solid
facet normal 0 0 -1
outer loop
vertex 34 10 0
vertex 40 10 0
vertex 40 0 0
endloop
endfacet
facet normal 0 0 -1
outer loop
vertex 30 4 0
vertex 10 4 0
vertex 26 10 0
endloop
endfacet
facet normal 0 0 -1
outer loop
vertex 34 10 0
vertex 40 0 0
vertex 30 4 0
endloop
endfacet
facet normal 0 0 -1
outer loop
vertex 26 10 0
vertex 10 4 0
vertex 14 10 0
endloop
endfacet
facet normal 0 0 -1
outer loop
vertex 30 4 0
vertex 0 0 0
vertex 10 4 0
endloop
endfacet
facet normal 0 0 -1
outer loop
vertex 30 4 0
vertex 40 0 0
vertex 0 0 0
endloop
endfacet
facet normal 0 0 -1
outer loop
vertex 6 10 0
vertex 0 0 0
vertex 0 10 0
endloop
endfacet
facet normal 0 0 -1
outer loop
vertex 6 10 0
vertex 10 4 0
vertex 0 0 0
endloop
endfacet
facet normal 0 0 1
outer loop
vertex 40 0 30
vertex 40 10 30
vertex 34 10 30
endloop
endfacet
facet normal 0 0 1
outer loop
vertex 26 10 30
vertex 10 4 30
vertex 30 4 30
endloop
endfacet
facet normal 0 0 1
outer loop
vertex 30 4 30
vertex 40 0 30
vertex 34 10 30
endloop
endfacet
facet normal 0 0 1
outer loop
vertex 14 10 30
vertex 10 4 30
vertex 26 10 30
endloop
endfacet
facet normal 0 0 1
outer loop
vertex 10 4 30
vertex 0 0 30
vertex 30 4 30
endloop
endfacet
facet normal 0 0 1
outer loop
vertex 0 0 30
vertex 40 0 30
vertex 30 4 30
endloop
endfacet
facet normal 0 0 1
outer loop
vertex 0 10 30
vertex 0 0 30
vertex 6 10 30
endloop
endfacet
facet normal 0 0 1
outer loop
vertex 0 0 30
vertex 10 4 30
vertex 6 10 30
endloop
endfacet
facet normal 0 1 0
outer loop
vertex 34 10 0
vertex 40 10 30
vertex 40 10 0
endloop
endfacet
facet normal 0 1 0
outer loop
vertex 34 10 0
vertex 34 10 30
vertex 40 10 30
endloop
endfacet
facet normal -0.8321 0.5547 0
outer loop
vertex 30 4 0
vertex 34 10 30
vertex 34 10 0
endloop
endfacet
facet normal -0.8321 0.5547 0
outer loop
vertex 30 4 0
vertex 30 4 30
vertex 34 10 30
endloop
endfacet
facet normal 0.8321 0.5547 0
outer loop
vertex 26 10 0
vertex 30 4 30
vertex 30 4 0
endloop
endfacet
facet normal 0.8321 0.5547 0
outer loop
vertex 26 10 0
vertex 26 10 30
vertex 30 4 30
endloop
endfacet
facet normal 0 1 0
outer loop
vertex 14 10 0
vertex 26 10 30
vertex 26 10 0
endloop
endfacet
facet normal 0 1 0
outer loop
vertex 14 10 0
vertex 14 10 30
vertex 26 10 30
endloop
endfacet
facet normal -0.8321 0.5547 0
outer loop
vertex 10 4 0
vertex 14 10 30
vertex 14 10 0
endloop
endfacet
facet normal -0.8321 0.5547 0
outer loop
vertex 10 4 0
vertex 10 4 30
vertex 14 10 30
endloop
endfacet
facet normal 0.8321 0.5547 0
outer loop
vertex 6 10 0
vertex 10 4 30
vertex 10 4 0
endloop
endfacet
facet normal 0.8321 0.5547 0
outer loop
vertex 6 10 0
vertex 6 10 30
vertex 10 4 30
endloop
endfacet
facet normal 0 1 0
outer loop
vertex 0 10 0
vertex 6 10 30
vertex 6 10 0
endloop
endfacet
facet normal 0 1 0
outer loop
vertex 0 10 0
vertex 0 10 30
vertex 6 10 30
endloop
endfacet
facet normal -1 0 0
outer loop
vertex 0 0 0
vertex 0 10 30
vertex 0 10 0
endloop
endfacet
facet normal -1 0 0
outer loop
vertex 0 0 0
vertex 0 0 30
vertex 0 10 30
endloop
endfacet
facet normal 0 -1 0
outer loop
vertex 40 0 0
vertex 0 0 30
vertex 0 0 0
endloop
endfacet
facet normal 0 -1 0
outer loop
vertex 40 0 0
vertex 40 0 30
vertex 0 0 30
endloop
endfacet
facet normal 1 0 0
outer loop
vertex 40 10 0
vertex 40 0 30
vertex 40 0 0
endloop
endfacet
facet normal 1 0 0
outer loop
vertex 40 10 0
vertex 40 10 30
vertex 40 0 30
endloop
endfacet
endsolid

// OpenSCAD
$fn = 32;

// ----------------------------------------------------------------------
// V guide rail: doublev, 40 mm wide
// ----------------------------------------------------------------------

// --- parameters (mm) ---
rail_w = 40;              // rail width, X
base_t = 10;              // base plate thickness
v_depth = 6;              // V feature depth / height
v_half_w = 8;             // half width of the V at the base face
plate_t = 30;             // rail length, Z (the extrusion height)
groove_off = 10;          // offset of each groove from the centreline

centre_x = rail_w / 2;  // rail centreline
groove_a = centre_x - groove_off;  // axis of the first groove
groove_b = centre_x + groove_off;  // axis of the second groove

profile = [[0, 0], [40, 0], [40, 10], [34, 10], [30, 4], [26, 10], [14, 10], [10, 4], [6, 10], [0, 10]];  // primary outline, 10 points, counter clockwise

// --- the one profile operation ---
linear_extrude(height = plate_t) polygon(points = profile);
